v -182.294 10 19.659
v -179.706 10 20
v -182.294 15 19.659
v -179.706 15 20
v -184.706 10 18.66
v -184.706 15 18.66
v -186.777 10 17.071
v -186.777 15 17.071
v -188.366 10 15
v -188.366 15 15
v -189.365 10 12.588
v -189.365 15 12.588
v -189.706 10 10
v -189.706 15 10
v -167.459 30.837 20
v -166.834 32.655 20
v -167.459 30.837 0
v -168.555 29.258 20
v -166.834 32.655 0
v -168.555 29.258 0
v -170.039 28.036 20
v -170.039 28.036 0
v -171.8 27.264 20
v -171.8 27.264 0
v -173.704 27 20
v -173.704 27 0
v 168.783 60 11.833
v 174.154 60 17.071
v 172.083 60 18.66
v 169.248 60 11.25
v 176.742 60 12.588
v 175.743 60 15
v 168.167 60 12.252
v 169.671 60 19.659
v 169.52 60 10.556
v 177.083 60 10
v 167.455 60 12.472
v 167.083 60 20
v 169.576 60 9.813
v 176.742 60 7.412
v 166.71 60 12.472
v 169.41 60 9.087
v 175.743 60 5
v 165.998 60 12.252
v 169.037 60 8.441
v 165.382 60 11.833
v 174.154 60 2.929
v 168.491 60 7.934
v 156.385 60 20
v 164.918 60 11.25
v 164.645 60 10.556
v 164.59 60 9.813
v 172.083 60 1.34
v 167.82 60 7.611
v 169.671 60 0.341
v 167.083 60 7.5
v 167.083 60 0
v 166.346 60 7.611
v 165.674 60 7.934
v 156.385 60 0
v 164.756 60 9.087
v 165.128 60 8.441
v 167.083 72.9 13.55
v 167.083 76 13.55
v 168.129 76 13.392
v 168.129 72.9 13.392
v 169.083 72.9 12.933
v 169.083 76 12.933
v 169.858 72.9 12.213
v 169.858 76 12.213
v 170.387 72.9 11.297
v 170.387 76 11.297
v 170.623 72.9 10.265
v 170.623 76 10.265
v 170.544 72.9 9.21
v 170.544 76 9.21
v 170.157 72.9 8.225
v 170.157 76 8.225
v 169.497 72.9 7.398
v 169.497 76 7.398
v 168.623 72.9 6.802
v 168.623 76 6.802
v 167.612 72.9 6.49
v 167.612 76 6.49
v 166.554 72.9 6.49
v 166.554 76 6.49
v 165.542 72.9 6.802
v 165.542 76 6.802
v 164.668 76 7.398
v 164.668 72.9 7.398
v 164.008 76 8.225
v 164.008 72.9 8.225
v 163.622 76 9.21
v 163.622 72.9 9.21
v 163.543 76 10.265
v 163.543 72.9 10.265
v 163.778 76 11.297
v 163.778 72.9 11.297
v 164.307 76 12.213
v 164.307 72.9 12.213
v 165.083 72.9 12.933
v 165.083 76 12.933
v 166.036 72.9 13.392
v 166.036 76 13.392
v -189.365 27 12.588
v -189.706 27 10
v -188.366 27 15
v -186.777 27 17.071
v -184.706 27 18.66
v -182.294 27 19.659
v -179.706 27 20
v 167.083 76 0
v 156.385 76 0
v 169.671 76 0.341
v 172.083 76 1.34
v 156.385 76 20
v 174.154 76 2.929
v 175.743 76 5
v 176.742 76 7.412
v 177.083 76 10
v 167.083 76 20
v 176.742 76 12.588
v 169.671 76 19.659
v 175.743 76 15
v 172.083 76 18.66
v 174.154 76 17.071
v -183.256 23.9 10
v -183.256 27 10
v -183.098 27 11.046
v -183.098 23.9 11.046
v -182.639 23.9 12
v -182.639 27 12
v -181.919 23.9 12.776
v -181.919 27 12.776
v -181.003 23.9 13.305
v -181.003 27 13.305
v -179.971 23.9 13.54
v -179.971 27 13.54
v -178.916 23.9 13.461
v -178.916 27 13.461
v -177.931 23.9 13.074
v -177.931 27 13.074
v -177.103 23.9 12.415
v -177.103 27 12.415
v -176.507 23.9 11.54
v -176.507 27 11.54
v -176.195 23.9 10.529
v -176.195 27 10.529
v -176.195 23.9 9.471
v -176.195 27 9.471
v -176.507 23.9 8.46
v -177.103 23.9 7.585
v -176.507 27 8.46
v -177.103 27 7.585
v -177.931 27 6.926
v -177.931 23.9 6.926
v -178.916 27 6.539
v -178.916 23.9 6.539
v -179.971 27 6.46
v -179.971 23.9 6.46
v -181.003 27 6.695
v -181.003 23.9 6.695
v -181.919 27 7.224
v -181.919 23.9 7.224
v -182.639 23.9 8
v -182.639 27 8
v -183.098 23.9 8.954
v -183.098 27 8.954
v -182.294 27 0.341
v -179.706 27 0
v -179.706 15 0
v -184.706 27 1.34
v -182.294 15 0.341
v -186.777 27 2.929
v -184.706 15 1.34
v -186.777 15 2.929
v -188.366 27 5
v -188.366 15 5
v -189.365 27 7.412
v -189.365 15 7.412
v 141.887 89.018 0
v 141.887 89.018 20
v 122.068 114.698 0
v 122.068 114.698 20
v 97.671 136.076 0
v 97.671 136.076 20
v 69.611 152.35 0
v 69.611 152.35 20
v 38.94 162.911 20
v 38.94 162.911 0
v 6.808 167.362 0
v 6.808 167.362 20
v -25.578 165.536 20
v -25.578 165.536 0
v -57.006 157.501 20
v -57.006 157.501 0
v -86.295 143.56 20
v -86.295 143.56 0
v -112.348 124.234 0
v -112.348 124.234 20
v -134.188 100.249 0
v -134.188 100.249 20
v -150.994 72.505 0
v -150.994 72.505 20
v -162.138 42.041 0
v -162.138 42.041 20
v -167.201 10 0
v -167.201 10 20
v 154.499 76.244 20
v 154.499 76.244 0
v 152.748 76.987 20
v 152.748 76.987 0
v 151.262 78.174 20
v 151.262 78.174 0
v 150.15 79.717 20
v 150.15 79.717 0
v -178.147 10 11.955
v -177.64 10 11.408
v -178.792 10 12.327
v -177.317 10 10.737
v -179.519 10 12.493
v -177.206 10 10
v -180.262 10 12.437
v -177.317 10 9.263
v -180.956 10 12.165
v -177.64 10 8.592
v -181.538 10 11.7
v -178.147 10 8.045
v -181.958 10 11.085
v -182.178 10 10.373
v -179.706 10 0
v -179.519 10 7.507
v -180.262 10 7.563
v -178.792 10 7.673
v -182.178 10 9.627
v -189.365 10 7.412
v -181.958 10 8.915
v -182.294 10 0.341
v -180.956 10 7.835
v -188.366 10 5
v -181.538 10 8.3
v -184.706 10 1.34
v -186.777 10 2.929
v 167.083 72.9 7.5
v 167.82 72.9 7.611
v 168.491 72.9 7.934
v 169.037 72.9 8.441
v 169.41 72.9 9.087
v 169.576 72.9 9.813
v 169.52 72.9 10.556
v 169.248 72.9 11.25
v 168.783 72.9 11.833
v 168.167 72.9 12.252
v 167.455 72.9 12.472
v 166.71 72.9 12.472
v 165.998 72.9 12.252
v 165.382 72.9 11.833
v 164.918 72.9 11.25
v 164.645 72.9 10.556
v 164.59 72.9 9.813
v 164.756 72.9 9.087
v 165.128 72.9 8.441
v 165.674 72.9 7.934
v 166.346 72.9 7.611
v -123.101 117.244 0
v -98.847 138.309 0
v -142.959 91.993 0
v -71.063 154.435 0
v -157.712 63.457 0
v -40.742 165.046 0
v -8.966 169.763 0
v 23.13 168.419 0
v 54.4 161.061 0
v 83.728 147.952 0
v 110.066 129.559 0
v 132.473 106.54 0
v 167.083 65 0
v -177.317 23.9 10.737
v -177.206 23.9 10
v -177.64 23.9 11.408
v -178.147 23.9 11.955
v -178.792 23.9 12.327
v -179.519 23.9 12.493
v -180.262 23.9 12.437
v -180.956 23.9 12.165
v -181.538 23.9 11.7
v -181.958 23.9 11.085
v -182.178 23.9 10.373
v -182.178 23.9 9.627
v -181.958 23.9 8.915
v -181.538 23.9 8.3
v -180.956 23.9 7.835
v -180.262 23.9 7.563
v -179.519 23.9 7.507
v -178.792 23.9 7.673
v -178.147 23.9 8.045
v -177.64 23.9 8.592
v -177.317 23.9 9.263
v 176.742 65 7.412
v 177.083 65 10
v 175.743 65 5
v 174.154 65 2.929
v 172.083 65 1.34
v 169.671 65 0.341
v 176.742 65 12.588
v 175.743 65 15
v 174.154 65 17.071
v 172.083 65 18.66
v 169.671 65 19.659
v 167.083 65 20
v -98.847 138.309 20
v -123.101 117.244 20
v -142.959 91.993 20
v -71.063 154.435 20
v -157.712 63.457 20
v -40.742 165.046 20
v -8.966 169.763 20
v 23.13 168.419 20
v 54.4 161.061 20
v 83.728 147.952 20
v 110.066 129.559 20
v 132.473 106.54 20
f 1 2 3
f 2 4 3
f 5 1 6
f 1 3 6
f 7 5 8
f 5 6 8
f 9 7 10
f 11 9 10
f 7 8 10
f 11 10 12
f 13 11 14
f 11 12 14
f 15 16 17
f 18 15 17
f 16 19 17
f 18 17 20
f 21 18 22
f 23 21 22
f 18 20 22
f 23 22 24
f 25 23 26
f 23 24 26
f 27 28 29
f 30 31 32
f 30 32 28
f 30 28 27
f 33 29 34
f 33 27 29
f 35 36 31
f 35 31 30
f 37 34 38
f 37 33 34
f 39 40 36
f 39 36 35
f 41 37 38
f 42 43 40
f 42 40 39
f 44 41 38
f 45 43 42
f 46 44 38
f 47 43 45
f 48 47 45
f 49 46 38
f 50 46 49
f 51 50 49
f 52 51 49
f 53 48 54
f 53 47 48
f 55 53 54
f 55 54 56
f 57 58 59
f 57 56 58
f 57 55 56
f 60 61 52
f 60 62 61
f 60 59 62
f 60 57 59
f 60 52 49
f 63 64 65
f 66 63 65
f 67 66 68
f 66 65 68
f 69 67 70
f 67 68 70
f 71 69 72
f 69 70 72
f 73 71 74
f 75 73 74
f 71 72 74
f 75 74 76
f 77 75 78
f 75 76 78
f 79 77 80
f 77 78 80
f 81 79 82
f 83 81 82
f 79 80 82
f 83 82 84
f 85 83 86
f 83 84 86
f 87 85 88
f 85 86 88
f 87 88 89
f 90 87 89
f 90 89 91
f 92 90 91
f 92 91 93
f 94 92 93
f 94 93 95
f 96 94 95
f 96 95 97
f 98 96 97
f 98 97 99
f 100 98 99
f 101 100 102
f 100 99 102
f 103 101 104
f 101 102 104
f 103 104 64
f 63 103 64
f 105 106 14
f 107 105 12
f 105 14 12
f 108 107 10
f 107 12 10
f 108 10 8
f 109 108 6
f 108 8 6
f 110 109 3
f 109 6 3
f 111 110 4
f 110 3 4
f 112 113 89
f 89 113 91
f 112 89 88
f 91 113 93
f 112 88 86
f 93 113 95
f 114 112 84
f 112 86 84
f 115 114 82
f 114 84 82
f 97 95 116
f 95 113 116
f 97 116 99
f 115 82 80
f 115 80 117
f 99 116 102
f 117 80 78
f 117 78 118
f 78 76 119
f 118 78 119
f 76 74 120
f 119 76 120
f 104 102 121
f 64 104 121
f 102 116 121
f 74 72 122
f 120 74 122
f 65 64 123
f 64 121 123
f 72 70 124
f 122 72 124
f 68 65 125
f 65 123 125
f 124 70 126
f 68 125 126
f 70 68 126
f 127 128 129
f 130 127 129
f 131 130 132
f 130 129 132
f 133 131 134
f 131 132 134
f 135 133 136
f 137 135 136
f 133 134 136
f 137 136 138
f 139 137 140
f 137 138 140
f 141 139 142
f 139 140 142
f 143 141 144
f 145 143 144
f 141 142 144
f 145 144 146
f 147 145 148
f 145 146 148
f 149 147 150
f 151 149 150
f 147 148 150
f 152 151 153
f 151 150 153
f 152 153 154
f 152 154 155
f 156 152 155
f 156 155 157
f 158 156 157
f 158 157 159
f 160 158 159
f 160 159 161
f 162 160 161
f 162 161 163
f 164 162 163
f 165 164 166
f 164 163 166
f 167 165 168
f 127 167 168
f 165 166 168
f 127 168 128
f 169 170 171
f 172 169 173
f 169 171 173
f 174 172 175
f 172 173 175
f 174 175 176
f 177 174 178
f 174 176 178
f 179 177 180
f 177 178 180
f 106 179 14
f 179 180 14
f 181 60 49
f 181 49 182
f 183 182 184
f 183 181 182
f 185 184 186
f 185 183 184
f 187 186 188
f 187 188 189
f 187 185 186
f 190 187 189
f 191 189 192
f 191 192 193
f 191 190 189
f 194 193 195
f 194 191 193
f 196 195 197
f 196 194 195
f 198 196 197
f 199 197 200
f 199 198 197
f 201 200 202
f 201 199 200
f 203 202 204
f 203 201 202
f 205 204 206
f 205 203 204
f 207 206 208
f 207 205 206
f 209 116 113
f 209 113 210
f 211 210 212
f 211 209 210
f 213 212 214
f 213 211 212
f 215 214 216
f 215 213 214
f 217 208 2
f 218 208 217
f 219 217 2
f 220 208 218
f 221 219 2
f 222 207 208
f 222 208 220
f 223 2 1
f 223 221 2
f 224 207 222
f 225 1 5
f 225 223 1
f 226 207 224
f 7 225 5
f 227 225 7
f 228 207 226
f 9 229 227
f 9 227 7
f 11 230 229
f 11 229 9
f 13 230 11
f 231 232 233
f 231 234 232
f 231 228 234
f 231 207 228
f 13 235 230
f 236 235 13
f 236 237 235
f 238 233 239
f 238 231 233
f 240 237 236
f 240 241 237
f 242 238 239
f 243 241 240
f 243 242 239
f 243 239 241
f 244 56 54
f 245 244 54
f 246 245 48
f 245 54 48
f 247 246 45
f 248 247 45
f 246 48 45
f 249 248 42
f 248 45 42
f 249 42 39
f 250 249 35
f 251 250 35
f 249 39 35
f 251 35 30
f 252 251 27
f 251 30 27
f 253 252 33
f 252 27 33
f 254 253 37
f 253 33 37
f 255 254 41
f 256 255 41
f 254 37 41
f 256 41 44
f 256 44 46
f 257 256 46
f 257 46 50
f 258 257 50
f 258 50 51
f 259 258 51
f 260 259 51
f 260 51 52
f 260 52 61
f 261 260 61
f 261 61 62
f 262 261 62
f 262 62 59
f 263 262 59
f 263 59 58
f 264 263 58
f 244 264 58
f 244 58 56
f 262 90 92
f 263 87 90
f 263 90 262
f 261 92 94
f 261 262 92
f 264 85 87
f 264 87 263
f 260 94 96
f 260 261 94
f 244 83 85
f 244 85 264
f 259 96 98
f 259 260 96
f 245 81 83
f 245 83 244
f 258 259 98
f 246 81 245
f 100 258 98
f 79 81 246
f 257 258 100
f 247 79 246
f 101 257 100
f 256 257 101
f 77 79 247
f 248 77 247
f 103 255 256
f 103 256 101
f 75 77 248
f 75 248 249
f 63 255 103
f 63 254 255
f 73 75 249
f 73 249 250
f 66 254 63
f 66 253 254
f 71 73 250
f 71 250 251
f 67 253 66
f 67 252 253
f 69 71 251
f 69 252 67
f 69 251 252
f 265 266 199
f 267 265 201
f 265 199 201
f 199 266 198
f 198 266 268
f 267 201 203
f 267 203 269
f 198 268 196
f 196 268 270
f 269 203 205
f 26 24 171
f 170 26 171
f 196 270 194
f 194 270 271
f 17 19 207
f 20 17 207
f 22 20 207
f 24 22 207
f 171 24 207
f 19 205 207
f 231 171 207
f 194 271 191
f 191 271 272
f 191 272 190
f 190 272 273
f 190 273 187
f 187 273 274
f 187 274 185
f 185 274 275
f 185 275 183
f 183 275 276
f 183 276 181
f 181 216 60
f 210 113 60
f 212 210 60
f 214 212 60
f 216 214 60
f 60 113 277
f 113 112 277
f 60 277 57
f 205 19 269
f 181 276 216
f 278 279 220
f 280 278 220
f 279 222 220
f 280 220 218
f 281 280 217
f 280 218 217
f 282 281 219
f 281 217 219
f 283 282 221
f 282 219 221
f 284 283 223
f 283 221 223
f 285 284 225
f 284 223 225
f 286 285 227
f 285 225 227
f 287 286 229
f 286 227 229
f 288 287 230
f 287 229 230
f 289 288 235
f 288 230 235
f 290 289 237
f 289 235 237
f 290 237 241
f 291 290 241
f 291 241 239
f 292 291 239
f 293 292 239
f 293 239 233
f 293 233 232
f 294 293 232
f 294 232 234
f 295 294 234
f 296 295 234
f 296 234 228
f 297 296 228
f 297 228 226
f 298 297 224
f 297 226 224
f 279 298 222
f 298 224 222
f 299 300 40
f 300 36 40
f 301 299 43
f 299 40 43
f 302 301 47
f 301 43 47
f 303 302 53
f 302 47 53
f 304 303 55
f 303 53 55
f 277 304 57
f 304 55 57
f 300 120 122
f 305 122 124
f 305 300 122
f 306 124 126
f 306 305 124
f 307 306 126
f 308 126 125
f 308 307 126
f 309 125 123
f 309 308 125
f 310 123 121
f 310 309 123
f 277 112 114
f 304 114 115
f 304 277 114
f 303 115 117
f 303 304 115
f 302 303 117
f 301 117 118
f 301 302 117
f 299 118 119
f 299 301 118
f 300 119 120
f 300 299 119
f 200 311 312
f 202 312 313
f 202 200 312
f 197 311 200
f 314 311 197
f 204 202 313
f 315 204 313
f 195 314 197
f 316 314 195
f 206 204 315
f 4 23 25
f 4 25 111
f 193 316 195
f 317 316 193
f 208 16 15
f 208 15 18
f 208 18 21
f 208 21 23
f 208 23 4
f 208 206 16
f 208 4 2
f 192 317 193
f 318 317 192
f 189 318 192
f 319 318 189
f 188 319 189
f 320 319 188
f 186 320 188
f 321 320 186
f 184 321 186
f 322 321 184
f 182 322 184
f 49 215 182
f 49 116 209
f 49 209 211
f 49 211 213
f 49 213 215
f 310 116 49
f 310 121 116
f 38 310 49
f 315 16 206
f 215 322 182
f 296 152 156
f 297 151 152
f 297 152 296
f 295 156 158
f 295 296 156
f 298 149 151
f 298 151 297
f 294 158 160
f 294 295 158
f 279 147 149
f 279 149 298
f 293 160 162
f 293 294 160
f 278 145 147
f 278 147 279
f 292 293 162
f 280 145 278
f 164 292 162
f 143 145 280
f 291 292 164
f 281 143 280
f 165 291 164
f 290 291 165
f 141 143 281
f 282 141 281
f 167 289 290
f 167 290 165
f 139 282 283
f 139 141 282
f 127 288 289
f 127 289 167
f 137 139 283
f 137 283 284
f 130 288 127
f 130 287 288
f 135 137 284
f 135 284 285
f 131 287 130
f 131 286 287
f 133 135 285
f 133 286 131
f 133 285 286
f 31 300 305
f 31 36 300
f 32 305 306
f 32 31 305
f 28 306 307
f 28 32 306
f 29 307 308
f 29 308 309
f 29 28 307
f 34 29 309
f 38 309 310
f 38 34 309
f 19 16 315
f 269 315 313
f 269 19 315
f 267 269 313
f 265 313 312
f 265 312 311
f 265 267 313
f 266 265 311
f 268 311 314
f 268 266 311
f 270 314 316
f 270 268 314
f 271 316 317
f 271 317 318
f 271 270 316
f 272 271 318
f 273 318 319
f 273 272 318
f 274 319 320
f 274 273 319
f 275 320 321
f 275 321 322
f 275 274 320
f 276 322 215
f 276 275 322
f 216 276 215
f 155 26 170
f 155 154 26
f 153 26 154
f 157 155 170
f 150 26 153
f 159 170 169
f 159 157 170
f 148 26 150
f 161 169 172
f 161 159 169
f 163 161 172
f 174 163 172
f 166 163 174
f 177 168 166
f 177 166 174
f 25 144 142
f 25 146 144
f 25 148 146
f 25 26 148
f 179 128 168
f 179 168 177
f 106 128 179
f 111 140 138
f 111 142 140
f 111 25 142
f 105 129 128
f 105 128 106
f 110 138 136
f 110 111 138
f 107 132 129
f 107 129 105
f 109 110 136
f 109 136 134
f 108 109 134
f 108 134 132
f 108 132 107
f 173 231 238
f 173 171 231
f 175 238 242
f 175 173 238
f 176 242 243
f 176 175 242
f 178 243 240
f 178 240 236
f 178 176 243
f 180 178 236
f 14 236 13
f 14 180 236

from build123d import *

# Parameters (mm, degrees)
RESSALTO_EXTRUS_O6_DEPTH  = 20
FILETE4_R                 = 10
FILETE5_R                 = 10
RESSALTO_EXTRUS_O14_DEPTH = 17
RESSALTO_EXTRUS_O15_DEPTH = 16
FILETE6_R                 = 7
FILETE7_R                 = 7
ESBO_O25_R                = 2.5
CORTE_EXTRUS_O1_DEPTH     = 16
ESBO_O27_R                = 2.5
CORTE_EXTRUS_O2_DEPTH     = 18
ESBO_O28_R                = 3.55
CORTE_EXTRUS_O3_DEPTH     = 3.1
ESBO_O29_R                = 2.5
CORTE_EXTRUS_O4_DEPTH     = 22.1
ESBO_O30_R                = 3.55
CORTE_EXTRUS_O5_DEPTH     = 3.1


# Some blends are built 0.0001 mm under size
with BuildPart() as part:
    # Esboço2 → Ressalto-extrusão6 (new body)
    with BuildSketch(Plane.XY):
        with BuildLine():
            Line((157.082780724, 65), (177.082780724, 65))
            Line((177.082780724, 65), (177.082780724, 60))
            Line((177.082780724, 60), (156.38494173, 60))
            ThreePointArc((156.38494173, 60), (-25.578272063, 165.535500719), (-167.201226072, 10))
            Line((-167.201226072, 10), (-189.705627485, 10))
            Line((-189.705627485, 10), (-189.705627485, 15))
            Line((-189.705627485, 15), (-169.336942219, 15))
            ThreePointArc((-169.336942219, 15), (-25.739874096, 168.040051421), (157.082780724, 65))
        make_face()
    extrude(amount=RESSALTO_EXTRUS_O6_DEPTH)

    # Filete4
    filete4_edges = [part.edges().sort_by_distance(p)[0] for p in [
        (177.082780724, 62.5, 0),
        (177.082780724, 62.5, 20),
    ]]
    fillet(filete4_edges, radius=FILETE4_R - 0.0001)  # a hair under: the kernel refuses the full size

    # Filete5
    filete5_edges = [part.edges().sort_by_distance(p)[0] for p in [
        (-189.705627485, 12.5, 0),
        (-189.705627485, 12.5, 20),
    ]]
    fillet(filete5_edges, radius=FILETE5_R - 0.0001)  # a hair under: the kernel refuses the full size

    # Esboço20 → Ressalto-extrusão14 (add)
    with BuildSketch(Plane.XZ.offset(-10)):
        with BuildLine():
            Line((-167.201226072, 20), (-167.201226072, 0))
            Line((-167.201226072, 0), (-179.705627485, 0))
            ThreePointArc((-179.705627485, 0), (-186.776695297, 2.928932188), (-189.705627485, 10))
            ThreePointArc((-189.705627485, 10), (-186.776695297, 17.071067812), (-179.705627485, 20))
            Line((-179.705627485, 20), (-167.201226072, 20))
        make_face()
    extrude(amount=-RESSALTO_EXTRUS_O14_DEPTH)

    # Esboço21 → Ressalto-extrusão15 (add)
    with BuildSketch(Plane.XZ.offset(-60)):
        with BuildLine():
            Line((156.38494173, 20), (156.38494173, 0))
            Line((156.38494173, 0), (167.082780724, 0))
            ThreePointArc((167.082780724, 0), (174.153848536, 2.928932188), (177.082780724, 10))
            ThreePointArc((177.082780724, 10), (174.153848536, 17.071067812), (167.082780724, 20))
            Line((167.082780724, 20), (156.38494173, 20))
        make_face()
    extrude(amount=-RESSALTO_EXTRUS_O15_DEPTH)

    # Filete6
    # the kernel refuses this fillet: 7 mm, written as the material it adds along each edge
    with BuildSketch(Plane(origin=(156.38494173, 66.66145813, 20), x_dir=(0, 1, 0), z_dir=(0, 0, -1))) as filete6_piece_1:
        with BuildLine():
            CenterArc((16.33834975, -0.051861764), FILETE6_R, 179.575501806, 62.459929256)
            Line((13.055871472, -6.234525943), (12.990221907, -6.358179227))
            ThreePointArc((12.990221907, -6.358179227), (6.533962206, -3.104642795), (-0.054897671, -0.128787599))
            Line((-0.054897671, -0.128787599), (0, 0.14))
            ThreePointArc((0, 0.14), (4.669270935, 0.14), (9.198545713, 0.001037235))
            Line((9.198545713, 0.001037235), (9.33854187, 0))
        make_face()
    extrude(amount=20)

    # Filete7
    filete7_edges = [part.edges().sort_by_distance(p)[0] for p in [
        (-167.842187784, 27, 10),
    ]]
    fillet(filete7_edges, radius=FILETE7_R)

    # Esboço25 → Corte-extrusão1 (cut)
    with BuildSketch(Plane.XZ.offset(-10)):
        with Locations((-179.705627485, 10)):
            Circle(ESBO_O25_R)
    extrude(amount=-CORTE_EXTRUS_O1_DEPTH, mode=Mode.SUBTRACT)

    # Esboço27 → Corte-extrusão2 (cut)
    with BuildSketch(Plane.XZ.offset(-10)):
        with Locations((-179.705627485, 10)):
            Circle(ESBO_O27_R)
    extrude(amount=-CORTE_EXTRUS_O2_DEPTH, mode=Mode.SUBTRACT)

    # Esboço28 → Corte-extrusão3 (cut)
    with BuildSketch(Plane(origin=(0, 27, 0), x_dir=(1, 0, 0), z_dir=(0, 1, 0))):
        with Locations(Location((-179.705627485, -10, 0), (0, 0, 180))):
            Circle(ESBO_O28_R)
    extrude(amount=-CORTE_EXTRUS_O3_DEPTH, mode=Mode.SUBTRACT)

    # Esboço29 → Corte-extrusão4 (cut)
    with BuildSketch(Plane.XZ.offset(-60)):
        with Locations(Location((167.082780724, 10, 0), (0, 0, 270))):
            Circle(ESBO_O29_R)
    extrude(amount=-CORTE_EXTRUS_O4_DEPTH, mode=Mode.SUBTRACT)

    # Esboço30 → Corte-extrusão5 (cut)
    with BuildSketch(Plane(origin=(0, 76, 0), x_dir=(1, 0, 0), z_dir=(0, 1, 0))):
        with Locations(Location((167.082780724, -10, 0), (0, 0, 270))):
            Circle(ESBO_O30_R)
    extrude(amount=-CORTE_EXTRUS_O5_DEPTH, mode=Mode.SUBTRACT)


solid = part.part
